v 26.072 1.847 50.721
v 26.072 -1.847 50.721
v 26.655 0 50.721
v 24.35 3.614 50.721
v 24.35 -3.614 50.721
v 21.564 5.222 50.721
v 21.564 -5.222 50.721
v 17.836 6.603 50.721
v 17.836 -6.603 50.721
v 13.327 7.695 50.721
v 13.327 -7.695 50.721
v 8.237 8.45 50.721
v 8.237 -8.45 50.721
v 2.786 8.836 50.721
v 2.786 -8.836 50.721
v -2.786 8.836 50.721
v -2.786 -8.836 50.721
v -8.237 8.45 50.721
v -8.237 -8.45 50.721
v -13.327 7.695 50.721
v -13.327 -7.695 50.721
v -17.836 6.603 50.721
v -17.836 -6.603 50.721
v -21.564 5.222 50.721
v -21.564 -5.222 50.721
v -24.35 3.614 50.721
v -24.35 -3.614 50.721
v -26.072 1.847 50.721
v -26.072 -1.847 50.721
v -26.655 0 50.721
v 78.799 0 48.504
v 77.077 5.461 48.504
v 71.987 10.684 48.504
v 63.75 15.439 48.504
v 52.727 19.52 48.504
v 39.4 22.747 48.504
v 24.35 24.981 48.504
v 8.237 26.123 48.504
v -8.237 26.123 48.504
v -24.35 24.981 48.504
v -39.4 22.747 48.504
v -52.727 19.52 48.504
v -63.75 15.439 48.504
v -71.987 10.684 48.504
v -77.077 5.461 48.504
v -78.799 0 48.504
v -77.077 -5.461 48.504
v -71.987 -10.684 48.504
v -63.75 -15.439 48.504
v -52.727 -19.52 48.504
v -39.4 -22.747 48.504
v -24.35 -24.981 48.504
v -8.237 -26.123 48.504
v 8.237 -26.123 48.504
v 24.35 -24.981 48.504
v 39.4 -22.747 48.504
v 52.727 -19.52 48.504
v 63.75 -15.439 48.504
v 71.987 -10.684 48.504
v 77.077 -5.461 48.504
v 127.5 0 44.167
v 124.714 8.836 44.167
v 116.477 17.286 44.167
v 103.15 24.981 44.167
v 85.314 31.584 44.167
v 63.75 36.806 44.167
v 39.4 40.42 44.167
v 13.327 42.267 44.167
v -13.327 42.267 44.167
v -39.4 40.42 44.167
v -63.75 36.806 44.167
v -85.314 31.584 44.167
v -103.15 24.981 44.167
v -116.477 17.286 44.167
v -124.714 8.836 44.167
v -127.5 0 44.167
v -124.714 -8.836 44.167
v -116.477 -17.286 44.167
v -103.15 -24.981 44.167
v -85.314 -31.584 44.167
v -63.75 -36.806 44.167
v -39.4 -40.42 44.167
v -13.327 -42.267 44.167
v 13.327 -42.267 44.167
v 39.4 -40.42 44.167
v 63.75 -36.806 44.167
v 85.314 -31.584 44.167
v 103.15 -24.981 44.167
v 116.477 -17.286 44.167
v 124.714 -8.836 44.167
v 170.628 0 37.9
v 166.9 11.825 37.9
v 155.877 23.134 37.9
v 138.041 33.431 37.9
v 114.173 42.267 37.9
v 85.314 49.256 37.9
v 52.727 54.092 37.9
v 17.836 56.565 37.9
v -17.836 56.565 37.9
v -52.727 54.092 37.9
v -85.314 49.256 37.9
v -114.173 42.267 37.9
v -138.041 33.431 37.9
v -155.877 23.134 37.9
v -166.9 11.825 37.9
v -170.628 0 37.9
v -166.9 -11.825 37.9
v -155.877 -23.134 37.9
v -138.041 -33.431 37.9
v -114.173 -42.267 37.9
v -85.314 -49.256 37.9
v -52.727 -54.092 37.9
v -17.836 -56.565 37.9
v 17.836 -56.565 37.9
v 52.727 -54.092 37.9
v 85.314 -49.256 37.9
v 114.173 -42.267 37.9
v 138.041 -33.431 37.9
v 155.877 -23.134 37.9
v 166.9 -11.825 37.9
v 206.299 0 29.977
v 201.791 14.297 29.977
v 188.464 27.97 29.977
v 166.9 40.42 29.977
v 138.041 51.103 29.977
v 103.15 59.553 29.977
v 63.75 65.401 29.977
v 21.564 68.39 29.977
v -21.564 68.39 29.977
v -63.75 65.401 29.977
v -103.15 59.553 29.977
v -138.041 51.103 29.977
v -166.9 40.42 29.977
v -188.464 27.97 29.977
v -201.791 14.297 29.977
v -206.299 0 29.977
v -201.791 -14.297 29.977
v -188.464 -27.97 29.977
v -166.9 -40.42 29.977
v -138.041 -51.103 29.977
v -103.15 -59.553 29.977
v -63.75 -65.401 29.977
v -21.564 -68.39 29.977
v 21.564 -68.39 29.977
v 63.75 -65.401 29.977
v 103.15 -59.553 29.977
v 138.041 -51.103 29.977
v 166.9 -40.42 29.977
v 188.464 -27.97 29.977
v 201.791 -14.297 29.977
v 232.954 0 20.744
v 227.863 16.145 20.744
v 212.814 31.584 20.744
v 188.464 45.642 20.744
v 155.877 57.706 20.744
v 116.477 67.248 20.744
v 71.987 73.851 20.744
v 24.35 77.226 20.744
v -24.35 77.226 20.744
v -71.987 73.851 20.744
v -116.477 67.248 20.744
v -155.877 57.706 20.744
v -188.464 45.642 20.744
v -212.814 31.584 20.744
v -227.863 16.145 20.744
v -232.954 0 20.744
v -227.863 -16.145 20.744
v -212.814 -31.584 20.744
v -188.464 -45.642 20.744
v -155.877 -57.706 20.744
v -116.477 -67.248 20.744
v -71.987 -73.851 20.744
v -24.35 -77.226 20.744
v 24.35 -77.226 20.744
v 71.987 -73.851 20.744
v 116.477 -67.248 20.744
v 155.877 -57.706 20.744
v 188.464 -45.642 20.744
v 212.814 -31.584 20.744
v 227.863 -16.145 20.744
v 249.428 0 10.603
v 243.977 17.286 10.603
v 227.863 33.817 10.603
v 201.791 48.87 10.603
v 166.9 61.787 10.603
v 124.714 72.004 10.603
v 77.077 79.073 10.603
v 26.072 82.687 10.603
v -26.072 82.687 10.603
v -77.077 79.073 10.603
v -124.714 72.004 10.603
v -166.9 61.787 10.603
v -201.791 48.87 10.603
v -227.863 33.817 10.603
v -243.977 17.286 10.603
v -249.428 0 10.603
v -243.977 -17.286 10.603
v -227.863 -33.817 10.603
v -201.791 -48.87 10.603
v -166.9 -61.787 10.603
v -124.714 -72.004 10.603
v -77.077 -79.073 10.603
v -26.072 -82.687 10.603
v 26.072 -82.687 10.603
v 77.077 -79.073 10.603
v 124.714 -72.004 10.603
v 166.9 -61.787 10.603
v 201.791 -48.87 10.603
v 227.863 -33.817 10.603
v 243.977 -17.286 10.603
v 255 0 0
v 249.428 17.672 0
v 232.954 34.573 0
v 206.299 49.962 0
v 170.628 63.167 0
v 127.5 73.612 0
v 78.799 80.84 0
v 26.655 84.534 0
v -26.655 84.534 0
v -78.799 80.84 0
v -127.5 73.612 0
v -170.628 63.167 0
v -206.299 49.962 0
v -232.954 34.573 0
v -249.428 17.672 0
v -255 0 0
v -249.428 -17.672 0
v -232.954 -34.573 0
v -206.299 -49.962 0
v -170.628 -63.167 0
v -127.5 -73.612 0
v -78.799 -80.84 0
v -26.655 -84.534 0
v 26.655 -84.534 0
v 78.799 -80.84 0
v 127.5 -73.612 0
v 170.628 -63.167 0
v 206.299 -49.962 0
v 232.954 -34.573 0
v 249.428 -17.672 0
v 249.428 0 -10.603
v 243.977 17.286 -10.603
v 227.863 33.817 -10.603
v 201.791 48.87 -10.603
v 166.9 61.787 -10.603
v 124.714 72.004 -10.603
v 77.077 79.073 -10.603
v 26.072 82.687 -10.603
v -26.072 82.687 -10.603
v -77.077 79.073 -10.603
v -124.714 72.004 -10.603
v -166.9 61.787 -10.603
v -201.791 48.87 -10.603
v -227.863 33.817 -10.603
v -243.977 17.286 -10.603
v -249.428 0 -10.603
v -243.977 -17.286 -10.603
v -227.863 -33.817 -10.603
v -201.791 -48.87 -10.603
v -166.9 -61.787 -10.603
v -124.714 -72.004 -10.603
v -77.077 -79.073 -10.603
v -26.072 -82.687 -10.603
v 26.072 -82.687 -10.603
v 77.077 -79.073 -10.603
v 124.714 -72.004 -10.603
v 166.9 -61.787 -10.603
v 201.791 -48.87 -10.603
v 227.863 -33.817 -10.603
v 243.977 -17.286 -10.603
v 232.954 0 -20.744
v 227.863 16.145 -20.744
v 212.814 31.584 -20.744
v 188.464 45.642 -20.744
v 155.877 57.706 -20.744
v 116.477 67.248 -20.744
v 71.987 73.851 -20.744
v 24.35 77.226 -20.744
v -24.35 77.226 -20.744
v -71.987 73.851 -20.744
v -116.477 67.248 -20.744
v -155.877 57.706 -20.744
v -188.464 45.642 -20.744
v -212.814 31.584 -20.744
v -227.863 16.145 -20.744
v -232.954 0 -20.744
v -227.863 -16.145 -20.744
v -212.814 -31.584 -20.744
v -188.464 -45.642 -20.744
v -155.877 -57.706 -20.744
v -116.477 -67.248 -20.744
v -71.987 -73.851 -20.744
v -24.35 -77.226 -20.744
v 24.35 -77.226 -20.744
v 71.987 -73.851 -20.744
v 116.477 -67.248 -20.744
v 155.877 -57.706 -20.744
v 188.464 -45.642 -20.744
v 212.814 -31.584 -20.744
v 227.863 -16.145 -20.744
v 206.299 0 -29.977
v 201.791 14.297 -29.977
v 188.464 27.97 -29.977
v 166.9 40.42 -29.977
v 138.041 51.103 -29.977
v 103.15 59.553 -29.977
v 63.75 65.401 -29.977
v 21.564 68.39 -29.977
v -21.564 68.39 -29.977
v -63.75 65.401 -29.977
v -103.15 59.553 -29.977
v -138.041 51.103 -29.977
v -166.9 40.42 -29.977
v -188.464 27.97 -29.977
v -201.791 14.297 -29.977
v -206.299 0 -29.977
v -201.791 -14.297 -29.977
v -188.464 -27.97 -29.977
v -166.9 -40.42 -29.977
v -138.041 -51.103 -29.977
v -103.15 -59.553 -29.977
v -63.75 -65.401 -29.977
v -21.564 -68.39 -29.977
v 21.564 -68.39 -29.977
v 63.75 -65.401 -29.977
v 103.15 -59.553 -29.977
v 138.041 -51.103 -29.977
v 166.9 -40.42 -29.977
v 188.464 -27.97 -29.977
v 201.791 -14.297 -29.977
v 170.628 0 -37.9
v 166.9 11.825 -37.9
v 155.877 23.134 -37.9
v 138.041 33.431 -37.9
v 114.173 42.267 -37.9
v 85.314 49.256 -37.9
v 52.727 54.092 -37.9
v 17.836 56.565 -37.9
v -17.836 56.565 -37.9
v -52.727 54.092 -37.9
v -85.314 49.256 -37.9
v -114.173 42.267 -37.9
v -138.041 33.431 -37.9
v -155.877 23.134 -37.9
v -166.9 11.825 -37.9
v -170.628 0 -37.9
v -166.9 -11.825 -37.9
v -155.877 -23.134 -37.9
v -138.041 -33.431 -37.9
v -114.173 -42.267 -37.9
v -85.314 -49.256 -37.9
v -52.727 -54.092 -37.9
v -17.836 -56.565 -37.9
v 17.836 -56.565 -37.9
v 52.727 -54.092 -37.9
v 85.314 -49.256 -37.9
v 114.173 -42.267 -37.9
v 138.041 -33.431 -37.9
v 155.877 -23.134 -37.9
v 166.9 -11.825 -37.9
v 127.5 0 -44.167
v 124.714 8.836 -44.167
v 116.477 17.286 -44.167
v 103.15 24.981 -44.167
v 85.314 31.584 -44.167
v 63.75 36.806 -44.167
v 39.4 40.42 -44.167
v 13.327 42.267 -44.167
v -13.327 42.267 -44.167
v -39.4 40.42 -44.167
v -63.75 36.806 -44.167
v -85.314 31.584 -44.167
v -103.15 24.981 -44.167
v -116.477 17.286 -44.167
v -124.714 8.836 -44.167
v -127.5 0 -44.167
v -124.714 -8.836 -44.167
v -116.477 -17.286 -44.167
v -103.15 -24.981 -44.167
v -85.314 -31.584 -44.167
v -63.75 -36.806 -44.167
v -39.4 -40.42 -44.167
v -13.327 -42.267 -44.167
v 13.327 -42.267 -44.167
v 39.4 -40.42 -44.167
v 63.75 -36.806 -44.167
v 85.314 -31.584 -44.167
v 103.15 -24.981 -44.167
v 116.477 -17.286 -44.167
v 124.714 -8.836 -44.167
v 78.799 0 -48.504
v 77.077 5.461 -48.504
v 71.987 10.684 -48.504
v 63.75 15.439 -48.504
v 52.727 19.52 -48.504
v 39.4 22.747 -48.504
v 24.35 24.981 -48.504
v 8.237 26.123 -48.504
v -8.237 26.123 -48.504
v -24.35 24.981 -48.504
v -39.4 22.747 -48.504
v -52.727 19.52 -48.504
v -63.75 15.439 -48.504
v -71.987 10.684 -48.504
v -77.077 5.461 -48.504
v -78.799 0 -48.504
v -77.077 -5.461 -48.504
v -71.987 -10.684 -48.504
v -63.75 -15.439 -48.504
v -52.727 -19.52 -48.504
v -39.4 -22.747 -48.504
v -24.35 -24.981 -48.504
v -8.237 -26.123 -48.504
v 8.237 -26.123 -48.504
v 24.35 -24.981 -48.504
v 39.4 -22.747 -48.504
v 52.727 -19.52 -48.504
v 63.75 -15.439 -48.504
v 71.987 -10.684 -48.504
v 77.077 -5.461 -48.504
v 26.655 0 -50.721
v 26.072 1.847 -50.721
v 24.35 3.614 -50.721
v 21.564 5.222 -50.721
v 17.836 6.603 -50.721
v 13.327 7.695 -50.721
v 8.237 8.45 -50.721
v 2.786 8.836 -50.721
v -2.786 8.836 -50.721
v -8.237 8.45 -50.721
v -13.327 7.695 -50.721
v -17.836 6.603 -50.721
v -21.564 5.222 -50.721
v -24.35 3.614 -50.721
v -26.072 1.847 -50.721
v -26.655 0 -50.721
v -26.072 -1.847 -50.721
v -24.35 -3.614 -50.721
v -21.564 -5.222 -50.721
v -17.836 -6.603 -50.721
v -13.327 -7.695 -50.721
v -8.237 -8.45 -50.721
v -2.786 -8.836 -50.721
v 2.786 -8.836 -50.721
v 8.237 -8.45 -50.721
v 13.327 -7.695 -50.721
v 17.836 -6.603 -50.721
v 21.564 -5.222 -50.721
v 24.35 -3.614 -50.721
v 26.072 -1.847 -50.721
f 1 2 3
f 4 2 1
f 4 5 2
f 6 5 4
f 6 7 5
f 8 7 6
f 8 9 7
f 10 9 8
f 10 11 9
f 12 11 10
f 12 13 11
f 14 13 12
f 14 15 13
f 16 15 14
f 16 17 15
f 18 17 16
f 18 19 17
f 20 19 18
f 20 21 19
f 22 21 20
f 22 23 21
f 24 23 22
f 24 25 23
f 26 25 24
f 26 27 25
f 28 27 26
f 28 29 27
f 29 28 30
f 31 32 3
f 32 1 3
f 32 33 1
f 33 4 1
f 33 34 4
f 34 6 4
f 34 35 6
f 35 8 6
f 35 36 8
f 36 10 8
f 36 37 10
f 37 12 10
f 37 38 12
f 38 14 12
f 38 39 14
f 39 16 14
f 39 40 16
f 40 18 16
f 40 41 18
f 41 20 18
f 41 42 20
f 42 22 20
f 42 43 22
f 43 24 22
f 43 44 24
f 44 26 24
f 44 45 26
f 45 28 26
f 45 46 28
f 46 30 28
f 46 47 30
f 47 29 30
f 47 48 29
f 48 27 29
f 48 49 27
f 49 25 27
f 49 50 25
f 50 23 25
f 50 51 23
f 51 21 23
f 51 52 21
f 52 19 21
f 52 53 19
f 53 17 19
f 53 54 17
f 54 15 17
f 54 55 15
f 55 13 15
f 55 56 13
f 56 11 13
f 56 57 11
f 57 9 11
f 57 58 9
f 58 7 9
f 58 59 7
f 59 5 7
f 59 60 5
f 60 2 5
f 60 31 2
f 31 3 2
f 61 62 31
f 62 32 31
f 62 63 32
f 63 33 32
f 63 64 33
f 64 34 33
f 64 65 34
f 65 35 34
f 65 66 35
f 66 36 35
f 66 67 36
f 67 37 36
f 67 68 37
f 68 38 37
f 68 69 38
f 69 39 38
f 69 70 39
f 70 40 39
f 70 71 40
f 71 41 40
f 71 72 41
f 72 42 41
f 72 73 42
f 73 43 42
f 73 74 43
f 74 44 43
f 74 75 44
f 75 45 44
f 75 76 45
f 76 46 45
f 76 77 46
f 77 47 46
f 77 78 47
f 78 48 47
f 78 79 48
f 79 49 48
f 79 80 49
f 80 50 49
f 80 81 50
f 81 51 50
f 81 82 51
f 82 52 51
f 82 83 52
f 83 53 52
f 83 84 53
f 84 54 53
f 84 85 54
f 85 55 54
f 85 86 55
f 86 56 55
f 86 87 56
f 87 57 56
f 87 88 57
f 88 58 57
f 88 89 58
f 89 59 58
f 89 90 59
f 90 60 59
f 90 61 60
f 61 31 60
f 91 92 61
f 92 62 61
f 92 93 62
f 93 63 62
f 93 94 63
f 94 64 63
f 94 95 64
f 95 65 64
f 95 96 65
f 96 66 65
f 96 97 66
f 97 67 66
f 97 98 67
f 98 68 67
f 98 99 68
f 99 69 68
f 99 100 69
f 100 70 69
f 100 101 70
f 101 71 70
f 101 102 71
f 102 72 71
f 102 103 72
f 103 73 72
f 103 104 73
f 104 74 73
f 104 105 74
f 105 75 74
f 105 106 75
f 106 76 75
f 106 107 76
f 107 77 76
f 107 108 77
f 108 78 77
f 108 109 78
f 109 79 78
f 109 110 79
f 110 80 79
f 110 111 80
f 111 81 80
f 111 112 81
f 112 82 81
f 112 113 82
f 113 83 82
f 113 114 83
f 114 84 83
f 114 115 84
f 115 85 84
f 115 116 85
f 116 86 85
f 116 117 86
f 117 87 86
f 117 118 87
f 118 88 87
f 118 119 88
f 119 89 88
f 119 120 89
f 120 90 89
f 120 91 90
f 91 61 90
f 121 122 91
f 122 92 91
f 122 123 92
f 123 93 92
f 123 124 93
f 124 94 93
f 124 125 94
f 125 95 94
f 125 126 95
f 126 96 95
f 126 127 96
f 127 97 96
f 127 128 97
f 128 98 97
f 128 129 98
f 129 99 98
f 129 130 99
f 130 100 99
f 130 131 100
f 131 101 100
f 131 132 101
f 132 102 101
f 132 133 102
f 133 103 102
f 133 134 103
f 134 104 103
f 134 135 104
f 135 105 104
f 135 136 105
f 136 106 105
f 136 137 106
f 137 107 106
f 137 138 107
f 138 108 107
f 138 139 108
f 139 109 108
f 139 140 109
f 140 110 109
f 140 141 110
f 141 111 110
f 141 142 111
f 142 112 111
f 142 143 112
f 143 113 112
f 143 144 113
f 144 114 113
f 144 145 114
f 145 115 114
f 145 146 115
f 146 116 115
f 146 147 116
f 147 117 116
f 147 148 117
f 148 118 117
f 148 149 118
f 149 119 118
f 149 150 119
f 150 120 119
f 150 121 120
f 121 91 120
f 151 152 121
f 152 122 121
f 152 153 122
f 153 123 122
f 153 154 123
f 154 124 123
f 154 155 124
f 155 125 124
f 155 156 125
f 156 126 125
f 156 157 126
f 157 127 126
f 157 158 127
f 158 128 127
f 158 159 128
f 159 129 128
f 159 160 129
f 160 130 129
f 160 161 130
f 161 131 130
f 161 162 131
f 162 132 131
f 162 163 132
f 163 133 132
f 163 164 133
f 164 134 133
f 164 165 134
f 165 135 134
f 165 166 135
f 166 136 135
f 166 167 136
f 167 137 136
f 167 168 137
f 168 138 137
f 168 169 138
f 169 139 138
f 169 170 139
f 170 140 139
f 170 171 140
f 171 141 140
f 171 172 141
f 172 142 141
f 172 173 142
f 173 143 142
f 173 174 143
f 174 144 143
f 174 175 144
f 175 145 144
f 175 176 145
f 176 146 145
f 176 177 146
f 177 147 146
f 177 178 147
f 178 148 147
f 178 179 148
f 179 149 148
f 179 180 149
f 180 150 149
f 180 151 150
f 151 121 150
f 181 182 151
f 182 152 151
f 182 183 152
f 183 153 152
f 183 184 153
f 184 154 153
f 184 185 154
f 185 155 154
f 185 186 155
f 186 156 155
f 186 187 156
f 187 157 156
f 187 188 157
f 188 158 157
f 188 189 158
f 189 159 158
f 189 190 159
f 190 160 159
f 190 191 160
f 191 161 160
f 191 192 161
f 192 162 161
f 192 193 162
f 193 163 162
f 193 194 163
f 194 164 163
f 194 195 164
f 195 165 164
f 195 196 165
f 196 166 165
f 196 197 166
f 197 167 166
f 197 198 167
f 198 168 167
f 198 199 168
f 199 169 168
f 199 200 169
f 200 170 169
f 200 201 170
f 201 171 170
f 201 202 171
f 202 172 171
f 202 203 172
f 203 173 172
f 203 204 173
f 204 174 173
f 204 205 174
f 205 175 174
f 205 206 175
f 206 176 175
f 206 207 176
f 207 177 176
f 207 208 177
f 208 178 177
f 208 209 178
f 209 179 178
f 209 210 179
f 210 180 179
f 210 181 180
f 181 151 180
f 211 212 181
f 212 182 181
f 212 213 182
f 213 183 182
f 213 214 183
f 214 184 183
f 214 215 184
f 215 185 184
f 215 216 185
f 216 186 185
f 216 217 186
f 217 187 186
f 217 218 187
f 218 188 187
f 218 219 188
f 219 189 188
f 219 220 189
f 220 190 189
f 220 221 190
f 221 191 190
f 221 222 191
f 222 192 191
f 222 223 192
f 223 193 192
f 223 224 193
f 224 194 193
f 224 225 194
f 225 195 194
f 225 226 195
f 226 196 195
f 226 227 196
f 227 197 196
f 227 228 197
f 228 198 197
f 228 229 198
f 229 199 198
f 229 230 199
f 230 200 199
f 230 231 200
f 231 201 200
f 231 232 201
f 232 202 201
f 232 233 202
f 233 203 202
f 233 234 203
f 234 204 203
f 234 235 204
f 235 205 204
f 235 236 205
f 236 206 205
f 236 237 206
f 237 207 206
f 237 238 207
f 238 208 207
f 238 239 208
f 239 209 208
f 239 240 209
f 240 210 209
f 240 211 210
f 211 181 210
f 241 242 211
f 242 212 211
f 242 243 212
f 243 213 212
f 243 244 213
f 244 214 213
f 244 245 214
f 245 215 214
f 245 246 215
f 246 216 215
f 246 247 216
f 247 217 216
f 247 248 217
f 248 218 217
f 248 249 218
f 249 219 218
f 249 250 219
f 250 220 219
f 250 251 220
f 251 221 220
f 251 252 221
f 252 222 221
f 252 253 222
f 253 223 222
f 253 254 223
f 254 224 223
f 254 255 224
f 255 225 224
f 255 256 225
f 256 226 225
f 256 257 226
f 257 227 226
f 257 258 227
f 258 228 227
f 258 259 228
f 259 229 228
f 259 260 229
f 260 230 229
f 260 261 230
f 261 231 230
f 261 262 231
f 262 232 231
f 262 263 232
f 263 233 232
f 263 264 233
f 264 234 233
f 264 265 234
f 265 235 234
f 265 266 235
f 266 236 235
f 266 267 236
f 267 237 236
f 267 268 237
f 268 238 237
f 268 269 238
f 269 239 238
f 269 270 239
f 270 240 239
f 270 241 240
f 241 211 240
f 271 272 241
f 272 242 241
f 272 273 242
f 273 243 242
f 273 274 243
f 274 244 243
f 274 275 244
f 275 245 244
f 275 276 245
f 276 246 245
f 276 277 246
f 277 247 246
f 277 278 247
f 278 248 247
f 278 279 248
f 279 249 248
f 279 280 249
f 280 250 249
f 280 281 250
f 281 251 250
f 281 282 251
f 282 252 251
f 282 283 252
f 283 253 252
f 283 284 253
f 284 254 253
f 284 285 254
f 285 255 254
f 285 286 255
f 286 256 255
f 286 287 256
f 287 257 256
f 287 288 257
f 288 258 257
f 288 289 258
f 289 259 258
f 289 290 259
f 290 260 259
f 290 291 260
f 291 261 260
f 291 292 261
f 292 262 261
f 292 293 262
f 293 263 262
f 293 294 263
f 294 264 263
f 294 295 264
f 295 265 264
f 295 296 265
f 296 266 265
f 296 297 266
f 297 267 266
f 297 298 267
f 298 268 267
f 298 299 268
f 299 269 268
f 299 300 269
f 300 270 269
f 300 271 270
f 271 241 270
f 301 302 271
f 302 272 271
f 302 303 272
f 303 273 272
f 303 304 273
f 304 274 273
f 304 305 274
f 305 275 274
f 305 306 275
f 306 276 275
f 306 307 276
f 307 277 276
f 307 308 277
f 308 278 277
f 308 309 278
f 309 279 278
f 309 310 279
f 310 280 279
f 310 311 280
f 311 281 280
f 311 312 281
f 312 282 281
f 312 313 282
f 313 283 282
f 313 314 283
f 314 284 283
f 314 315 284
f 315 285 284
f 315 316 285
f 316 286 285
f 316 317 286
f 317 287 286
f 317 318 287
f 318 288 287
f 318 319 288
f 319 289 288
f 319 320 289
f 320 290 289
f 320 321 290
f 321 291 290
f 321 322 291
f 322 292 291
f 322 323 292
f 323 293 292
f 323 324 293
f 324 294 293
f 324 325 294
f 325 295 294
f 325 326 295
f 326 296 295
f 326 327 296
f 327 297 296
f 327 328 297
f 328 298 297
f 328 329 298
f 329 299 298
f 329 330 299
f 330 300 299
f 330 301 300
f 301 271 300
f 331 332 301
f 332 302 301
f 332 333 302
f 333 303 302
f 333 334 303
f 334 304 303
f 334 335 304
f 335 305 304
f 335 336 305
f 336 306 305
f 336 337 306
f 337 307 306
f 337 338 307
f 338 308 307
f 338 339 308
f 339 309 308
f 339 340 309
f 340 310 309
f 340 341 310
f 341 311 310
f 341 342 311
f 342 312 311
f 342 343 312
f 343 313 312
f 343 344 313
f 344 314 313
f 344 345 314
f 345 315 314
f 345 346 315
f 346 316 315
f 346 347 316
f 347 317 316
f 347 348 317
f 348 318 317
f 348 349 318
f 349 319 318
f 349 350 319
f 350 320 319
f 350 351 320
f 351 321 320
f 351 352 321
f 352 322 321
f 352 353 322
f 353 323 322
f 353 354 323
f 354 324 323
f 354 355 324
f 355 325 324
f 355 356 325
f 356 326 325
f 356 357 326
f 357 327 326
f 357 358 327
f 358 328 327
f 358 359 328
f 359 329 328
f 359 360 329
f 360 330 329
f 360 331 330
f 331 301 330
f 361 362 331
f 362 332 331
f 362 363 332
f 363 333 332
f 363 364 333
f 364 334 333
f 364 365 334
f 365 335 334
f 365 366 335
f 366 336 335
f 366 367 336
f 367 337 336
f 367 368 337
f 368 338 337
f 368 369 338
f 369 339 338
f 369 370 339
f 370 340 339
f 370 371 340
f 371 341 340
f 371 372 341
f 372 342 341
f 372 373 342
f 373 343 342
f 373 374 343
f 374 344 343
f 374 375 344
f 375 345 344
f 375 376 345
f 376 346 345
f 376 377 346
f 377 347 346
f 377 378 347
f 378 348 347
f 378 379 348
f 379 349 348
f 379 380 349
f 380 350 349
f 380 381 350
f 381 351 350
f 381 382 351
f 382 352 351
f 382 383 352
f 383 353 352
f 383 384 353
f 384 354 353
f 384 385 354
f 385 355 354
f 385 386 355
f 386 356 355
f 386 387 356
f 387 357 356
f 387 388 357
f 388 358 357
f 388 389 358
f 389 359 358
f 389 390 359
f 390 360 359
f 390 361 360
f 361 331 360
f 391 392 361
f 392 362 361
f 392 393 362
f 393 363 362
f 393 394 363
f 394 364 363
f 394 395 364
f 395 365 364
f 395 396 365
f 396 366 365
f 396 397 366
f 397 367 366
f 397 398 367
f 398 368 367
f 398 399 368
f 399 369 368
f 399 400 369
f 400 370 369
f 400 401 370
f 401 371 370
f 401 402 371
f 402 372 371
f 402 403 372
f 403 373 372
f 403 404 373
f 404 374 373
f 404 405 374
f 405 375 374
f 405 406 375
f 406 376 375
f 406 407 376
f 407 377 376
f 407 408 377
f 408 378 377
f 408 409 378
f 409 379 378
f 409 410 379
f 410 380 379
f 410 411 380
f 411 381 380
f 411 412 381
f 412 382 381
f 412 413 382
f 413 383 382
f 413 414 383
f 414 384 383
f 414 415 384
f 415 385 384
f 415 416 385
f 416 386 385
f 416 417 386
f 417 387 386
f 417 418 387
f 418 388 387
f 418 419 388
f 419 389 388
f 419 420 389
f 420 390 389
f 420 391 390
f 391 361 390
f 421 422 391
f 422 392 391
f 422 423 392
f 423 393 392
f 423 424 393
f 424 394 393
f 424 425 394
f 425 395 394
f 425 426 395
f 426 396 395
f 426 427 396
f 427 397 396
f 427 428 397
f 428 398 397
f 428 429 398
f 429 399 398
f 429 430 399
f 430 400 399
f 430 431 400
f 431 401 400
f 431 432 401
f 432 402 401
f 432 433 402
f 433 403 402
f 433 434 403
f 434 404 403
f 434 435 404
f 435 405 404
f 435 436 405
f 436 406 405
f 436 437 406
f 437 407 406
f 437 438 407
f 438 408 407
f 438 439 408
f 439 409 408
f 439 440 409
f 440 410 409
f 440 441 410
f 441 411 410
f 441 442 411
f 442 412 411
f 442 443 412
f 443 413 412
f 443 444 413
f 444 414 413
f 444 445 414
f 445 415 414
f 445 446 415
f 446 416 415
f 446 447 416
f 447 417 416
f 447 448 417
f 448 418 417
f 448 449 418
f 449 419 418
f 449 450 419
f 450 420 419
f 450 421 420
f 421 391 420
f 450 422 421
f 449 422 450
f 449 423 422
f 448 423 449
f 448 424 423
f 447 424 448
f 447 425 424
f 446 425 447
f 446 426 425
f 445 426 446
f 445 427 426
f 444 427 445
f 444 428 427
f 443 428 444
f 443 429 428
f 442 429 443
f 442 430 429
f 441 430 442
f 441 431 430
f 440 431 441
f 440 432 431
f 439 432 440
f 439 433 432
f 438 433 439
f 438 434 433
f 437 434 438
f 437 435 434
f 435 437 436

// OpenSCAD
// Generated by SolidPython 1.0.1 on 2020-07-29 00:46:51


scale(v = [15, 5, 3]) {
	sphere(r = 17);
}
/***********************************************
*********      SolidPython code:      **********
************************************************
 
# import packages: SolidPython
from solid import *
from solid.utils import *
from itertools import chain, combinations, permutations


class Resize:

    def __init__(self, scad_file):
        self.scad_file = scad_file
        #self.scad_file = import_scad(scad_file)
        # cone/cylinder param:
        self.r1 = 0
        self.r2 = 0
        self.h = 0
        # rectangular prism param:
        self.w = 0
        self.l = 0
        # ellipse param:
        self.r = 0

    # import OpenScad code (file name corresponds to shape)


    # classify shape + parameters
    def assign(self, param1, param2, param3):
        if self.scad_file == 'cone.scad':
            self.r1 = param1
            self.r2 = param2
            self.h = param3
        elif self.scad_file == 'cylinder.scad':
            self.r1 = param1
            self.r2 = param2
            self.h = param3
        elif self.scad_file == 'rectangularPrism.scad':
            self.h = param1
            self.l = param2
            self.w = param3
        else:
            self.r = param1
            self.h = param2

    # resize parameters
    def iterate(self):
        x = range(3, 20, 2)
        i = 1
        if self.scad_file == 'cone.scad':
            tempList = list(permutations(x, 2))
            for temp in tempList:
                param1 = temp[0]
                param2 = temp[1]
                filepath = 'produced_scad_files/' + 'cone' + str(param1) + '_' + str(param2) + '_' + '.scad'
                scad_render_to_file(cylinder(h=param1, r1=param2, r2=0), filepath)

        elif self.scad_file == 'cylinder.scad':
            tempList = list(permutations(x, 3))
            for temp in tempList:
                param1 = temp[0]
                param2 = temp[1]
                filepath = 'produced_scad_files/' + 'cylinder' + str(param1) + '_' + str(param2) + '_' + '.scad'
                scad_render_to_file(cylinder(h=param1, r1=param2, r2=param2), filepath)

        elif self.scad_file == 'rectangularPrism.scad':
            tempList = list(permutations(x, 3))
            for temp in tempList:
                param1 = temp[0]
                param2 = temp[1]
                param3 = temp[2]
                filepath = 'produced_scad_files/' + 'rectangularPrism' + str(param1) + '_' + str(param2) + '_' + str(
                    param3) + '.scad'
                scad_render_to_file(cube(size=(param1, param2, param3)), filepath)

        elif self.scad_file == 'ellipse.scad':
            tempList = list(permutations(x, 4))
            for temp in tempList:
                param1 = temp[0]
                param2 = temp[1]
                param3 = temp[2]
                param4 = temp[3]
                filepath = 'produced_scad_files/' + 'ellipse' + str(param1) + '_' + str(param2) + '_' + str(param3) + '_' + str(param4) + '.scad'
                scad_render_to_file(scale([param1, param2, param3])(sphere(r=param4)), filepath)

    def render_to_scadfile(self):
        scad_render_to_file(scad, 'example.scad') 
 
************************************************/
